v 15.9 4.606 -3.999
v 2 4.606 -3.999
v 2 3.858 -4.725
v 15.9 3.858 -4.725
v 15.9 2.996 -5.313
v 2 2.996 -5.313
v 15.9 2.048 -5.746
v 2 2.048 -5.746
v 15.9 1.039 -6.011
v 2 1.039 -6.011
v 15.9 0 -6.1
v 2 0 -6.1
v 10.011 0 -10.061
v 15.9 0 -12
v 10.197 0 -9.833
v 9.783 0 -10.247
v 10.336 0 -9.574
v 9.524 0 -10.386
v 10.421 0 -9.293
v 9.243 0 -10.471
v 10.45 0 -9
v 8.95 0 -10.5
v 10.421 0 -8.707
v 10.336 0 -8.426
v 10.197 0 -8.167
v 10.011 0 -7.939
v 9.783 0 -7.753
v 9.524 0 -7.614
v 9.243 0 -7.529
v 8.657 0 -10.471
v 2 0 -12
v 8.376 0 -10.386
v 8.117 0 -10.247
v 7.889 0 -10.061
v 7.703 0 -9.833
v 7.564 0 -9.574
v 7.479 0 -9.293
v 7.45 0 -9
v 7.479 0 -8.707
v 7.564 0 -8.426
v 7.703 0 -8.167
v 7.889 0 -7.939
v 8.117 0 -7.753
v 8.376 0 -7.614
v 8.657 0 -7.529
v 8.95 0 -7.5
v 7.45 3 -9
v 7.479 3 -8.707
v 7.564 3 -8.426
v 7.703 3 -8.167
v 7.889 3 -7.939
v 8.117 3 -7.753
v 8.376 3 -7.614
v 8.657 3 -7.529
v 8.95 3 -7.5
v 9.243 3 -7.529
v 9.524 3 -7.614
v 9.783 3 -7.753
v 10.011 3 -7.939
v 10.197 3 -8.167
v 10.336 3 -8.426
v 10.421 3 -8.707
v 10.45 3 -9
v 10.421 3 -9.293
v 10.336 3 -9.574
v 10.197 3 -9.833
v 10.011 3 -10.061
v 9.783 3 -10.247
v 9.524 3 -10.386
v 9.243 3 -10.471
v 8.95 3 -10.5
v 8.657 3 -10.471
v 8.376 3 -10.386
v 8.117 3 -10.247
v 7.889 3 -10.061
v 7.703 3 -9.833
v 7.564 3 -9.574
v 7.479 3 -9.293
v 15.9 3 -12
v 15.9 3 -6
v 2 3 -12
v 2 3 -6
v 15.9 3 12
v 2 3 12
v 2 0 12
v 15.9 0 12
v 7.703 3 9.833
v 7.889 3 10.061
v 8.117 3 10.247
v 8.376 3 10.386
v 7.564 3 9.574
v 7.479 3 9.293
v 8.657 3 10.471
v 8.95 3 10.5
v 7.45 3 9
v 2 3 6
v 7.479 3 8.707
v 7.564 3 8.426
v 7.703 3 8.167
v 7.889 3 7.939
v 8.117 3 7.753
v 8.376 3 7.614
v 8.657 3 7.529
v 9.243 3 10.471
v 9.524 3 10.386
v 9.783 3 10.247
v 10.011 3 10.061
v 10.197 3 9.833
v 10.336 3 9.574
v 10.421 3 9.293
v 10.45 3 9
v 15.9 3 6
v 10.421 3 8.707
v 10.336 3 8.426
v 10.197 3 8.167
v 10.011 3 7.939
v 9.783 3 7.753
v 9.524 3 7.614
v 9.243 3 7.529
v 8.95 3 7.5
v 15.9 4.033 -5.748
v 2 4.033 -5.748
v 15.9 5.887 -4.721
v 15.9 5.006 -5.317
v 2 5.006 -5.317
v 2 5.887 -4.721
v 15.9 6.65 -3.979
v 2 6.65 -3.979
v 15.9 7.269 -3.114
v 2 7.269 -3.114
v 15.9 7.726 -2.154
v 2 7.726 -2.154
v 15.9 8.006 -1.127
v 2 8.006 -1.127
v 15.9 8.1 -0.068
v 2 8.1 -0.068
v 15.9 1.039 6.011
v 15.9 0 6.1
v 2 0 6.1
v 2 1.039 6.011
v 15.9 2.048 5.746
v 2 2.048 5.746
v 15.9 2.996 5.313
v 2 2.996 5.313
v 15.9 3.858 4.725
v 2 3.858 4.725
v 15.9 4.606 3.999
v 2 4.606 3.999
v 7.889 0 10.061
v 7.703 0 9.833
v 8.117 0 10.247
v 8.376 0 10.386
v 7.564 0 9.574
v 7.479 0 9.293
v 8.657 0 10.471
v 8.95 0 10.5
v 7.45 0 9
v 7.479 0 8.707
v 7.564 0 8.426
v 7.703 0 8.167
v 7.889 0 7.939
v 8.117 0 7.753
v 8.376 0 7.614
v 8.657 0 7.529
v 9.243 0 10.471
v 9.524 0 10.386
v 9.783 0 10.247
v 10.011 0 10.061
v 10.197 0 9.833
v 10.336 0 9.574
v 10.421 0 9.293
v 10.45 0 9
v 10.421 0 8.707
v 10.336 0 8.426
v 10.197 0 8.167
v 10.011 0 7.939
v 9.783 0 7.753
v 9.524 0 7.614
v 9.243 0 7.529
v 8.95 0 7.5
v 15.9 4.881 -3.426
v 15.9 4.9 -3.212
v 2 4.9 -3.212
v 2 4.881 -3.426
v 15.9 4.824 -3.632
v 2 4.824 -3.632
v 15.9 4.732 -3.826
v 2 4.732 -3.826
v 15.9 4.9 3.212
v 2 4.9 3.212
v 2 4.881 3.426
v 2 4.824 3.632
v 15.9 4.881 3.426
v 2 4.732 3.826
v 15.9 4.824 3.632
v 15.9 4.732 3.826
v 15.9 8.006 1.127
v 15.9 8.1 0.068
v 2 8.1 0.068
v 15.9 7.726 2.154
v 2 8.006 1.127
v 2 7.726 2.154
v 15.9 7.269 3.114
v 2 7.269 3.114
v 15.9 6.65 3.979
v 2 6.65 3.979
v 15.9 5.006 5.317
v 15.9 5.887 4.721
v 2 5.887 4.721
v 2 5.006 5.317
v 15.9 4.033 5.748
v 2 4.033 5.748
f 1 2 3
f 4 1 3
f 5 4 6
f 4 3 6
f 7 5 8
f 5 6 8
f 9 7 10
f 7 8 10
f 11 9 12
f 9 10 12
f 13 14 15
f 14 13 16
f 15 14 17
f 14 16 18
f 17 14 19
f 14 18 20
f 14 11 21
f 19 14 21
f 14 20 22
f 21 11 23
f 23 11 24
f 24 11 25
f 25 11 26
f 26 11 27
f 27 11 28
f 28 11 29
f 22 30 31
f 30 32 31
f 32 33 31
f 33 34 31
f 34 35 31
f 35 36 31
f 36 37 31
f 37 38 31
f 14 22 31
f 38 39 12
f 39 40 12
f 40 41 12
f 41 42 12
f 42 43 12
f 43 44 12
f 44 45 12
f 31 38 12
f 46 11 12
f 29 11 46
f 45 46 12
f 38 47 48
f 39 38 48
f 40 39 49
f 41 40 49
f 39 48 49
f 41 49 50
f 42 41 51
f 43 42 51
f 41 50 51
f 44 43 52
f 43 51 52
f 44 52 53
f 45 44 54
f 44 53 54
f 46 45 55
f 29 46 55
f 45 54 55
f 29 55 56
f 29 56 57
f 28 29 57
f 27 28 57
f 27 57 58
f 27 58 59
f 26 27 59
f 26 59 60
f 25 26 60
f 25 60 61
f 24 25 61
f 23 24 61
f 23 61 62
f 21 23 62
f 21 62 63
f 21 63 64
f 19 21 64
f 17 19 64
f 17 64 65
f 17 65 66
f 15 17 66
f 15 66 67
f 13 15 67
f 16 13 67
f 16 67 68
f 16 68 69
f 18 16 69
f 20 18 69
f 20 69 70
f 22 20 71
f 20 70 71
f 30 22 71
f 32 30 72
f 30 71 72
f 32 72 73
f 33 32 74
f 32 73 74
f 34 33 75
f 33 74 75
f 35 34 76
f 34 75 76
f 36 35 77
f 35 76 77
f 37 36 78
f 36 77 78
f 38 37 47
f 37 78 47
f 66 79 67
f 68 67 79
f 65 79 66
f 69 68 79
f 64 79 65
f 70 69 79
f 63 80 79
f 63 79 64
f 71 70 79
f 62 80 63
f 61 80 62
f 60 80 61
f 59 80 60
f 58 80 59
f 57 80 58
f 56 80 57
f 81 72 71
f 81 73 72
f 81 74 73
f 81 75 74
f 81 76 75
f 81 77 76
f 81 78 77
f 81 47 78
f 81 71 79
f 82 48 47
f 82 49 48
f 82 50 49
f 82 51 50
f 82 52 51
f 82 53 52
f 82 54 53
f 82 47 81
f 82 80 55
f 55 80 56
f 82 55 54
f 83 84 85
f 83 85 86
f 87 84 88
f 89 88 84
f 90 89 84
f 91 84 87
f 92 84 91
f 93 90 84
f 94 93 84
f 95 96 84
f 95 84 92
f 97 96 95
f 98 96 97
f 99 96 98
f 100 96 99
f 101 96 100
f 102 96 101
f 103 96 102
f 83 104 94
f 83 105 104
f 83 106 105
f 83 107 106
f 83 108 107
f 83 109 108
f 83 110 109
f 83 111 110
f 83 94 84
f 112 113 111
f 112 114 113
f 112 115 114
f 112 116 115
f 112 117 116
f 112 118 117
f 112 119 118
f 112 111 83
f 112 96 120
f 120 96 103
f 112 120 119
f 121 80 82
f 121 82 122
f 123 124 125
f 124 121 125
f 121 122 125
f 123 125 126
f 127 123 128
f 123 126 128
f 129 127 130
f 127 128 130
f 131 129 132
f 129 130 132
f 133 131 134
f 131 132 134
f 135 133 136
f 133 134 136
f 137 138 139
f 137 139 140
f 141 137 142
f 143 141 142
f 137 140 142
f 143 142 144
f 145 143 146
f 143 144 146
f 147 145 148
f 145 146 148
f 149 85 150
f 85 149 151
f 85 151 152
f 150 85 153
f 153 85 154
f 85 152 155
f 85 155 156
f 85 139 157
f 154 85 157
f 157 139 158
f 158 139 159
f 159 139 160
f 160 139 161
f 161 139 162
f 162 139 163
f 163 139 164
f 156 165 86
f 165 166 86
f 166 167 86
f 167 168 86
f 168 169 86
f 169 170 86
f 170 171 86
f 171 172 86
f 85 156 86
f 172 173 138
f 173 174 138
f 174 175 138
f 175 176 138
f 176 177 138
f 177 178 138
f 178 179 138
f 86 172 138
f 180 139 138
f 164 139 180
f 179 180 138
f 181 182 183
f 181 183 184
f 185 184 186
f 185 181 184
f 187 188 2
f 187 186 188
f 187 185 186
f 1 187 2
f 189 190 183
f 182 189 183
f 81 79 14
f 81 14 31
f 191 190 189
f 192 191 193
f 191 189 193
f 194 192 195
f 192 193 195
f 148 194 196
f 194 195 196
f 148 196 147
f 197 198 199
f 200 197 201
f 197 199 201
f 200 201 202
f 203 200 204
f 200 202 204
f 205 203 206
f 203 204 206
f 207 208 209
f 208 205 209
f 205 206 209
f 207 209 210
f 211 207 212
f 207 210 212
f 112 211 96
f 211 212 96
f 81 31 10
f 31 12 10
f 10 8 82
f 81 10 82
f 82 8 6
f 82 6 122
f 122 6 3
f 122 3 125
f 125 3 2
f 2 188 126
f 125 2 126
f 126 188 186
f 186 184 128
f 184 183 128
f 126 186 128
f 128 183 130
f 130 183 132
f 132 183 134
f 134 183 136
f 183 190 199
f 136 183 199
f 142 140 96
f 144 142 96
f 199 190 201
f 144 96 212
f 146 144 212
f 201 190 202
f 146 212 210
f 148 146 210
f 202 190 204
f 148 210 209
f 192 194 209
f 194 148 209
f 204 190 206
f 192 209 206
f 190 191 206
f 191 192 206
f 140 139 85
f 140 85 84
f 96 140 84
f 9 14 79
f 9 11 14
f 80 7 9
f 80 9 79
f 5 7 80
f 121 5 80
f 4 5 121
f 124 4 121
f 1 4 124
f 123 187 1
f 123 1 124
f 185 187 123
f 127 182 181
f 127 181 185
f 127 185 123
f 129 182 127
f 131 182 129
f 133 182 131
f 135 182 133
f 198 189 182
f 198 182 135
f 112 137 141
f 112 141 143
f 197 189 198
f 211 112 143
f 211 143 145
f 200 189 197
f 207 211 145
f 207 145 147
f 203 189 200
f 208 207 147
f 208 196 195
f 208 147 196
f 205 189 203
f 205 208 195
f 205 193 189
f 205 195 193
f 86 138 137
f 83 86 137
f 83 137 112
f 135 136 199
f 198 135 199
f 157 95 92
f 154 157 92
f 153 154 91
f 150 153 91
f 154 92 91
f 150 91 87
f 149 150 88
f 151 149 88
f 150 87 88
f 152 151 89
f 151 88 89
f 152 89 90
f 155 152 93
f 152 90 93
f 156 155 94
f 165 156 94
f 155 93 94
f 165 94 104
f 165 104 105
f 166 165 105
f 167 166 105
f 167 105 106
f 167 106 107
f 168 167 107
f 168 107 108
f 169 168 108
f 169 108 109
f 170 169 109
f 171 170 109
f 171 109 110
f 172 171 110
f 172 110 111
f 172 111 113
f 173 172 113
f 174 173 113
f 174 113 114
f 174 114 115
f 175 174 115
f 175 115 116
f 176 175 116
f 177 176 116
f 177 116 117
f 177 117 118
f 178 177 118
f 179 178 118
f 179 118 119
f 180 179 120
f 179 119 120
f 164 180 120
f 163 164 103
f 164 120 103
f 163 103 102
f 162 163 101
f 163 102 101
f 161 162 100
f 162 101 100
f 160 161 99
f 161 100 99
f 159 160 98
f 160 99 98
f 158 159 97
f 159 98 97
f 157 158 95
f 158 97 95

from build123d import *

# Parameters (mm, degrees)
RESSALTO_EXTRUS_O1_DEPTH   = 15.9
FILETE1_R                  = 6
FILETE2_R                  = 1.2
CORTE_EXTRUS_O2_DEPTH      = 20.463298795
CORTE_EXTRUS_O2_DEPTH_BACK = 20.463298795
ESBO_O3_W                  = 2
ESBO_O3_H                  = 20.053518914
ESBO_O4_W                  = 13.9
ESBO_O4_H                  = 3
RESSALTO_EXTRUS_O2_DEPTH   = 2
ESBO_O5_W                  = 13.9
ESBO_O5_H                  = 3
RESSALTO_EXTRUS_O3_DEPTH   = 2
CORTE_EXTRUS_O3_DEPTH      = 10


with BuildPart() as part:
    # Esboço1 → Ressalto-extrusão1 (new body)
    with BuildSketch(Plane(origin=(0, 0, 0), x_dir=(0, 0, -1), z_dir=(1, 0, 0))):
        with BuildLine():
            ThreePointArc((-3.633180425, 4.9), (-1.913112647, 5.792236183), (0, 6.1))
            ThreePointArc((0, 6.1), (1.913112647, 5.792236183), (3.633180425, 4.9))
            ThreePointArc((3.633180425, 4.9), (5.448504409, 2.742954557), (6.1, 0))
            Line((6.1, 0), (10, 0))
            Line((10, 0), (10, 3))
            Line((10, 3), (6, 3))
            Line((6, 3), (6, 8.1))
            Line((6, 8.1), (-6, 8.1))
            Line((-6, 8.1), (-6, 3))
            Line((-6, 3), (-10, 3))
            Line((-10, 3), (-10, 0))
            Line((-10, 0), (-6.1, 0))
            ThreePointArc((-6.1, 0), (-5.448504409, 2.742954557), (-3.633180425, 4.9))
        make_face()
        with BuildLine():
            ThreePointArc((3.633180425, 4.9), (1.913112647, 5.792236183), (0, 6.1))
            Line((0, 6.1), (0, 4.9))
            Line((0, 4.9), (3.633180425, 4.9))
        make_face()
        with BuildLine():
            Line((0, 4.9), (0, 6.1))
            ThreePointArc((0, 6.1), (-1.913112647, 5.792236183), (-3.633180425, 4.9))
            Line((-3.633180425, 4.9), (0, 4.9))
        make_face()
    extrude(amount=RESSALTO_EXTRUS_O1_DEPTH)

    # Filete1
    # the kernel refuses this fillet: 6 mm, written as the material it takes off along each edge
    with BuildSketch(Plane(origin=(-14.83028995, 8.1, 6), x_dir=(0, -1, 0), z_dir=(1, 0, 0))) as filete1_piece_1:
        with BuildLine():
            CenterArc((6, 5.93211598), FILETE1_R, 180, 81.373073441)
            Line((0, 5.93211598), (-0.12, 5.93211598))
            Line((-0.12, 5.93211598), (-0.12, 0))
            Line((-0.12, 0), (0, -0.12))
            ThreePointArc((0, -0.12), (2.55, -0.12), (5.082, -0.11864232))
            Line((5.082, -0.11864232), (5.1, 0))
        make_face()
    extrude(amount=45.5605799, mode=Mode.SUBTRACT)
    with BuildSketch(Plane(origin=(-14.83028995, 8.1, -6), x_dir=(0, -1, 0), z_dir=(1, 0, 0))) as filete1_piece_2:
        with BuildLine():
            CenterArc((6, -5.93211598), FILETE1_R, 98.626926559, 81.373073441)
            Line((0, -5.93211598), (-0.12, -5.93211598))
            Line((-0.12, -5.93211598), (-0.12, 0))
            Line((-0.12, 0), (0, 0.12))
            ThreePointArc((0, 0.12), (2.55, 0.12), (5.082, 0.11864232))
            Line((5.082, 0.11864232), (5.1, 0))
        make_face()
    extrude(amount=45.5605799, mode=Mode.SUBTRACT)

    # Filete2
    filete2_edges = [part.edges().sort_by_distance(p)[0] for p in [
        (7.95, 4.9, -3.633180425),
        (7.95, 4.9, 3.633180425),
    ]]
    fillet(filete2_edges, radius=FILETE2_R)

    # Esboço3 → Corte-extrusão2 (cut, two sides: drawn at the far end of the back side and taken through both)
    with BuildSketch(Plane(origin=(0, 3, 0), x_dir=(1, 0, 0), z_dir=(0, 1, 0)).offset(-CORTE_EXTRUS_O2_DEPTH_BACK)):
        with Locations((1, -0.026759457)):
            Rectangle(ESBO_O3_W, ESBO_O3_H)
    extrude(amount=CORTE_EXTRUS_O2_DEPTH + CORTE_EXTRUS_O2_DEPTH_BACK, mode=Mode.SUBTRACT)

    # Esboço4 → Ressalto-extrusão2 (add)
    with BuildSketch(Plane.XY.offset(10)):
        with Locations((8.95, 1.5)):
            Rectangle(ESBO_O4_W, ESBO_O4_H)
    extrude(amount=RESSALTO_EXTRUS_O2_DEPTH)

    # Esboço5 → Ressalto-extrusão3 (add)
    with BuildSketch(Plane(origin=(0, 0, -10), x_dir=(-1, 0, 0), z_dir=(0, 0, -1))):
        with Locations((-8.95, 1.5)):
            Rectangle(ESBO_O5_W, ESBO_O5_H)
    extrude(amount=RESSALTO_EXTRUS_O3_DEPTH)

    # Esboço8 → Corte-extrusão3 (cut)
    with BuildSketch(Plane(origin=(0, 3, 0), x_dir=(1, 0, 0), z_dir=(0, 1, 0))):
        with BuildLine():
            ThreePointArc((10.45, 9), (8.95, 10.5), (7.45, 9))
            Line((7.45, 9), (10.45, 9))
        make_face()
        with BuildLine():
            Line((10.45, 9), (7.45, 9))
            ThreePointArc((7.45, 9), (8.95, 7.5), (10.45, 9))
        make_face()
        with BuildLine():
            ThreePointArc((10.45, -9), (8.95, -7.5), (7.45, -9))
            Line((7.45, -9), (10.45, -9))
        make_face()
        with BuildLine():
            Line((10.45, -9), (7.45, -9))
            ThreePointArc((7.45, -9), (8.95, -10.5), (10.45, -9))
        make_face()
    extrude(amount=-CORTE_EXTRUS_O3_DEPTH, mode=Mode.SUBTRACT)


solid = part.part
